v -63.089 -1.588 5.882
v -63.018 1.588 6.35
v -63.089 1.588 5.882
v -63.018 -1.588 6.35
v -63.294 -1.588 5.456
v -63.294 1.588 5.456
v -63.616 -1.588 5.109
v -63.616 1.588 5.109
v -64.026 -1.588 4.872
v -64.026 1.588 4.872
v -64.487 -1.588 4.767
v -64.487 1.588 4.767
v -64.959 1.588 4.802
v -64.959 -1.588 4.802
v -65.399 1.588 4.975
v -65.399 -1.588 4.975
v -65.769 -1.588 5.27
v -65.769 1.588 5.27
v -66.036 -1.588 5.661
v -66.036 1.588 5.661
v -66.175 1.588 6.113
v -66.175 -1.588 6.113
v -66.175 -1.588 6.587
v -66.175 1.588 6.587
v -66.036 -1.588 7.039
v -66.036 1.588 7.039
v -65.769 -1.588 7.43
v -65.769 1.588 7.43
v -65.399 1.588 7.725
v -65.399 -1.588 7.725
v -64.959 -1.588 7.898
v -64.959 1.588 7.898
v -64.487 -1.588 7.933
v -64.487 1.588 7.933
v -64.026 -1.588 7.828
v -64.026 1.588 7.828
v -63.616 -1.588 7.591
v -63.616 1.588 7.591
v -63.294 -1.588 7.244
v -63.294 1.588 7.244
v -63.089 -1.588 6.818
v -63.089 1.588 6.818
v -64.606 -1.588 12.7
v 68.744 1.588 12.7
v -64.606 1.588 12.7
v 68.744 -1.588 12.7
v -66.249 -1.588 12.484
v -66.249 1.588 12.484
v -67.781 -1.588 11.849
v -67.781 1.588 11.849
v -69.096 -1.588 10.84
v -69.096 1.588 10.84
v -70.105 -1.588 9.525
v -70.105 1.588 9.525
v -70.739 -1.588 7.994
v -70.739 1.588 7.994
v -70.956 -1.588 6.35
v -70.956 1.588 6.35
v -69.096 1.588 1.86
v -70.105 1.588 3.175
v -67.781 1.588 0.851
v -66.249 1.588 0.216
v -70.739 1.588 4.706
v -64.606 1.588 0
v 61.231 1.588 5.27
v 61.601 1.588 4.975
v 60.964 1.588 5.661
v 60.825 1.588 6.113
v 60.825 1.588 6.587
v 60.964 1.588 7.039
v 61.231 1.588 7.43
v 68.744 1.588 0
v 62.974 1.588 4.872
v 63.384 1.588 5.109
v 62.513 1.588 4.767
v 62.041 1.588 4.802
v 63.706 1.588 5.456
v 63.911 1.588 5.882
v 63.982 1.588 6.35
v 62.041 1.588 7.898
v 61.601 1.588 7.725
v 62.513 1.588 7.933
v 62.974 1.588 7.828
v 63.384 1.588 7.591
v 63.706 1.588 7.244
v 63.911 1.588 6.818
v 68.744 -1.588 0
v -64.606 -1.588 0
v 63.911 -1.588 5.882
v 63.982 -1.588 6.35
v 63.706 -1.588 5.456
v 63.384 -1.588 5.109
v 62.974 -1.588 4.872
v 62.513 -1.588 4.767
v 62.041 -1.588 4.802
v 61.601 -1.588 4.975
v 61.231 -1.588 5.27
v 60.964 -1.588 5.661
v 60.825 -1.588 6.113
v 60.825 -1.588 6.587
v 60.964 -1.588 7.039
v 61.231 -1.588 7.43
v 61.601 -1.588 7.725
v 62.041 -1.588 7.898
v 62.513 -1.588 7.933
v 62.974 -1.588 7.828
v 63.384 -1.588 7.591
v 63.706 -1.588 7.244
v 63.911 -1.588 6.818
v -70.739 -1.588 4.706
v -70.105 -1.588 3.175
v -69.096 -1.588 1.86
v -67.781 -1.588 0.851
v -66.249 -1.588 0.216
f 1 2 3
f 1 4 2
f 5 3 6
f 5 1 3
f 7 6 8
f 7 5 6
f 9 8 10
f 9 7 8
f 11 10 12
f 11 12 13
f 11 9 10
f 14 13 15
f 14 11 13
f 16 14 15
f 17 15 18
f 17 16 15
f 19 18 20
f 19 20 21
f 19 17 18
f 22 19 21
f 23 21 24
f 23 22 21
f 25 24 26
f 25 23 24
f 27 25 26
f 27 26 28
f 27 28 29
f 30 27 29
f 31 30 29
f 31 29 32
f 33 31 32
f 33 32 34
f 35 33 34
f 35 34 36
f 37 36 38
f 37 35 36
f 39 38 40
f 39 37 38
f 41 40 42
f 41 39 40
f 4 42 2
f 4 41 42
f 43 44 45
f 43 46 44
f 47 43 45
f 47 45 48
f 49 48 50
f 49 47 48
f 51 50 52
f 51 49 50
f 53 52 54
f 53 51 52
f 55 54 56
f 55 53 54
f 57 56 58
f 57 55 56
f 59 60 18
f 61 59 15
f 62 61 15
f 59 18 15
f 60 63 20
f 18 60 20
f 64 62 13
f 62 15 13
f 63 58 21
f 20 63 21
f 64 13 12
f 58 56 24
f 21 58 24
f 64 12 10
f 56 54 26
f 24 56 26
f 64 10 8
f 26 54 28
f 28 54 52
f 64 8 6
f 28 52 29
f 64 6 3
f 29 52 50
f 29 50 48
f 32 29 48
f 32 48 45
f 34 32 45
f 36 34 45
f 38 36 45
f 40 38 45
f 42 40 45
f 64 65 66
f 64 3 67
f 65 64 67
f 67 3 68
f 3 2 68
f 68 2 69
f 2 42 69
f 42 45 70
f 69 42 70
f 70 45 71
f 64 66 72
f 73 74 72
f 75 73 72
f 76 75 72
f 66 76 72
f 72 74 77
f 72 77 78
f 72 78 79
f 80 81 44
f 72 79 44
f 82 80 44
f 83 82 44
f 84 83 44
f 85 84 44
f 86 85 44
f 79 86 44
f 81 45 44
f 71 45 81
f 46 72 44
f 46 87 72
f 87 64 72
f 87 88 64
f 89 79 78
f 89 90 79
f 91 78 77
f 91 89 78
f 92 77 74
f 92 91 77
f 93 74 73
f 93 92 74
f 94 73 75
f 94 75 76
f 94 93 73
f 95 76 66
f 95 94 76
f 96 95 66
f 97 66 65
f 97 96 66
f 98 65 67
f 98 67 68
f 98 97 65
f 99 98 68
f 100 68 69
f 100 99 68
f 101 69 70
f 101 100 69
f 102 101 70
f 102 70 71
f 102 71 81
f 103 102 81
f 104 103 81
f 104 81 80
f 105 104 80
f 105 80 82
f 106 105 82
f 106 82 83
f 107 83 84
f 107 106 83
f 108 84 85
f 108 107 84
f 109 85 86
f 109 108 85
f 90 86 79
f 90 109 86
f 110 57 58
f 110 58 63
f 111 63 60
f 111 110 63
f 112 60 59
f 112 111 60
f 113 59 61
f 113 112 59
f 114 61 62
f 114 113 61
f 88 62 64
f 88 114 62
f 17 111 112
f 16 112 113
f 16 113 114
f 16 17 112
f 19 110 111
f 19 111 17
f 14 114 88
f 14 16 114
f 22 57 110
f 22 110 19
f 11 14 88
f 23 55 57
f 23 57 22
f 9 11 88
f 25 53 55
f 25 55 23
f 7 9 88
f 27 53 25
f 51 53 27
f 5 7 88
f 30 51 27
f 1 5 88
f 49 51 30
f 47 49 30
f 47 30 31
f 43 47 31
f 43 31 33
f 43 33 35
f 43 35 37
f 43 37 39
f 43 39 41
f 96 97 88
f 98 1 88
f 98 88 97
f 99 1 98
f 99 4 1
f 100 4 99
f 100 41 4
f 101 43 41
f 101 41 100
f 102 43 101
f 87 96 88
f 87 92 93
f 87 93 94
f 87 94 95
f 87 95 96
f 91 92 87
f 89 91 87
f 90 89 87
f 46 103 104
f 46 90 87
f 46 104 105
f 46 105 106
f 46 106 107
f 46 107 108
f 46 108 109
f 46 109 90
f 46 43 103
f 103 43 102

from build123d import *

# Parameters (mm, degrees)
F1_DEPTH      = 1.5875
F1_DEPTH_BACK = 1.5875


with BuildPart() as f1:
    # F0 (on Front) → F1 (new body, two sides)
    with BuildSketch(Plane.XZ) as f1_sk:
        with BuildLine():
            Line((68.744436, 6.35), (68.744436, 12.7))
            Line((68.744436, 12.7), (-64.605564, 12.7))
            ThreePointArc((-64.605564, 12.7), (-69.095692, 10.840128), (-70.955564, 6.35))
            Line((-70.955564, 6.35), (-66.193064, 6.35))
            ThreePointArc((-66.193064, 6.35), (-64.605564, 7.9375), (-63.018064, 6.35))
            Line((-63.018064, 6.35), (60.806936, 6.35))
            ThreePointArc((60.806936, 6.35), (62.394436, 7.9375), (63.981936, 6.35))
            Line((63.981936, 6.35), (68.744436, 6.35))
        make_face()
        with BuildLine():
            Line((68.744436, 0), (68.744436, 6.35))
            Line((68.744436, 6.35), (63.981936, 6.35))
            ThreePointArc((63.981936, 6.35), (62.394436, 4.7625), (60.806936, 6.35))
            Line((60.806936, 6.35), (-63.018064, 6.35))
            ThreePointArc((-63.018064, 6.35), (-64.605564, 4.7625), (-66.193064, 6.35))
            Line((-66.193064, 6.35), (-70.955564, 6.35))
            ThreePointArc((-70.955564, 6.35), (-69.095692, 1.859872), (-64.605564, 0))
            Line((-64.605564, 0), (68.744436, 0))
        make_face()
    extrude(amount=F1_DEPTH)
    extrude(f1_sk.sketch, amount=-F1_DEPTH_BACK)


solid = f1.part
